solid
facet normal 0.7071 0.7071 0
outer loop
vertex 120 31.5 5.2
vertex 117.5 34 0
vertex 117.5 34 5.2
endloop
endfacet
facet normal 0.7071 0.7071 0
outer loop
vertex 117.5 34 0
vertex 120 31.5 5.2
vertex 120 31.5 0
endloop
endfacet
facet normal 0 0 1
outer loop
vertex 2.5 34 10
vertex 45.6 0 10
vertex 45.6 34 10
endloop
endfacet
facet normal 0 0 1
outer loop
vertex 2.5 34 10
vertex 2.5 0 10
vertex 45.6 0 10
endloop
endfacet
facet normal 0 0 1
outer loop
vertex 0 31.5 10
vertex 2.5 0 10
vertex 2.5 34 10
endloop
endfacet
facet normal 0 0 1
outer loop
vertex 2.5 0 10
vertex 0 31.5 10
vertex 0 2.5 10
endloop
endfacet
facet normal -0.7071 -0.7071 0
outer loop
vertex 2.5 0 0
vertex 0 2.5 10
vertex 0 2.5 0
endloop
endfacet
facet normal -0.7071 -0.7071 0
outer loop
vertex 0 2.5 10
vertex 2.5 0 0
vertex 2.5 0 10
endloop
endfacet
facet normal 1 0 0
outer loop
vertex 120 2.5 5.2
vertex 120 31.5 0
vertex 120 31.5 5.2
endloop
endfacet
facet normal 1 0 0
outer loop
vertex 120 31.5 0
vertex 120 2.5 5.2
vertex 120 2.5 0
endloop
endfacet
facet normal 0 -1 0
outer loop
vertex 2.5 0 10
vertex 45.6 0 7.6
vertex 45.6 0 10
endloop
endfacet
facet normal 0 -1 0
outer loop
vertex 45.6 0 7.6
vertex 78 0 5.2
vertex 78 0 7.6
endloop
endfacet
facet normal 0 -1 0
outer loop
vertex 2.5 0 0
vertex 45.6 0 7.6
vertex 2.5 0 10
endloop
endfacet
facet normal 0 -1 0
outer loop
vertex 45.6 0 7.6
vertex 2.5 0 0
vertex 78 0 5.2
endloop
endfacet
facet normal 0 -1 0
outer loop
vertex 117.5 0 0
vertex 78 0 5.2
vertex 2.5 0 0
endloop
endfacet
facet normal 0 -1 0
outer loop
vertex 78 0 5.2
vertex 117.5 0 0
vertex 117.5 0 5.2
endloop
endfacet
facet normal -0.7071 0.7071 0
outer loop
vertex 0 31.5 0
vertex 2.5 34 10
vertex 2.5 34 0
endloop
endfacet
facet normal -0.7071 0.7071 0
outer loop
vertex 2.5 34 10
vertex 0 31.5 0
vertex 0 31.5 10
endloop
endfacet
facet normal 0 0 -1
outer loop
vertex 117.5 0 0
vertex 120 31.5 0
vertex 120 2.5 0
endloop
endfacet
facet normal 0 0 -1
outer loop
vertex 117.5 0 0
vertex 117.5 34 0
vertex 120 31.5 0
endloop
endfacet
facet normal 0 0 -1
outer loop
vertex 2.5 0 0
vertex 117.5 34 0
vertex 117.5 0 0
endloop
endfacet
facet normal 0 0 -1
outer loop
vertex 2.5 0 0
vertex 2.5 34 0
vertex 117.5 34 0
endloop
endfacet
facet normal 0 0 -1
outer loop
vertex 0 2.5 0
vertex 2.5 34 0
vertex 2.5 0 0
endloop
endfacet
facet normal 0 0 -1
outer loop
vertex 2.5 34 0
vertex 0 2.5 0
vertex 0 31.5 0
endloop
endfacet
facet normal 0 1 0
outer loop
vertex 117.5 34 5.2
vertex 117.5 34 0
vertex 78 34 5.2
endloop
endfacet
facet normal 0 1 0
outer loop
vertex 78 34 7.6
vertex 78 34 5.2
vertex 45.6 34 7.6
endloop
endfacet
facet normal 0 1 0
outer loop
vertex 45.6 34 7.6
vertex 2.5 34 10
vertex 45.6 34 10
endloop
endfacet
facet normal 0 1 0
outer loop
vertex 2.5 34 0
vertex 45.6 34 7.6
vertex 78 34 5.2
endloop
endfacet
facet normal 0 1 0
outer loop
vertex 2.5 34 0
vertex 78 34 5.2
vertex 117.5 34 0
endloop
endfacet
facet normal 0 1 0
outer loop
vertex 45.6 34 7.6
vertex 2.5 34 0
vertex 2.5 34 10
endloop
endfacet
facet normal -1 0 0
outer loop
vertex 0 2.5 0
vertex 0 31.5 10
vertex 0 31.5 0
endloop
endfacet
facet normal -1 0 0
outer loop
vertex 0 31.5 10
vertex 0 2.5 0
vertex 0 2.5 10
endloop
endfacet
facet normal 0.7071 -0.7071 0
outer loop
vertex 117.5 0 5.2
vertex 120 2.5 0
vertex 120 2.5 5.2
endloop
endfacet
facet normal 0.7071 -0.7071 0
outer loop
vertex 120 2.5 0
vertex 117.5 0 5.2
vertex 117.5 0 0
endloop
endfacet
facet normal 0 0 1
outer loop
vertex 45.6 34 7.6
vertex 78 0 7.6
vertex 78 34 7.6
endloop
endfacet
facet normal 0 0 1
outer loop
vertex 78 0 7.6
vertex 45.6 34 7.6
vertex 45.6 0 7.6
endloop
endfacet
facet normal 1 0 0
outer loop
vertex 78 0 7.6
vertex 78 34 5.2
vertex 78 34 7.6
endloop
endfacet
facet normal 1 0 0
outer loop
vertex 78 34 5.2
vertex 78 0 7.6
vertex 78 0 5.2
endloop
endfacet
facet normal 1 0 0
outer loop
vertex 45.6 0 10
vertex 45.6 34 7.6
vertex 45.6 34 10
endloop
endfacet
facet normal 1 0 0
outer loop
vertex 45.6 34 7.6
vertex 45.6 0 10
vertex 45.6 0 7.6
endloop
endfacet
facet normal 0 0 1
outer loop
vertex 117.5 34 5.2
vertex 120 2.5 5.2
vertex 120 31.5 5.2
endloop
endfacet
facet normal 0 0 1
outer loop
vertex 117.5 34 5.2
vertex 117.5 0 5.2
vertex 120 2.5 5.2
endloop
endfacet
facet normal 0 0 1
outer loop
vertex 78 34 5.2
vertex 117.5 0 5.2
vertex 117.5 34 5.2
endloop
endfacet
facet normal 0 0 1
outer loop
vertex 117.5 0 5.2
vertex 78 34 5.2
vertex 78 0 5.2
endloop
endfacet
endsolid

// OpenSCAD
$fn = 32;

// ----------------------------------------------------------------------
// Stepped bar: twostep, 120 x 34 x 10/5.2 mm
// ----------------------------------------------------------------------

// --- parameters (mm) ---
bar_l = 120;              // bar length, X
bar_w = 34;               // bar width, Y
plate_t = 10;             // thickness of the thick zone, Z
thin_t = 5.2;             // thickness of the thin zone
corner_c = 2.5;           // corner chamfer of the bar
step_cut = 4.8;           // material removed from the thin zone
stair1_x = 45.6;          // position of the first stair
stair2_x = 78;            // position of the second stair
mid_t = 7.6;              // thickness of the middle zone
depth_1 = 2.4;            // depth of cut 1 from the top face
depth_2 = 4.8;            // depth of cut 2 from the top face

profile = [[2.5, 0], [117.5, 0], [120, 2.5], [120, 31.5], [117.5, 34], [2.5, 34], [0, 31.5], [0, 2.5]];  // primary outline, 8 points, counter clockwise
void_1 = [[45.6, -1], [78, -1], [78, 35], [45.6, 35]];  // first stair, 4 points
void_2 = [[78, -1], [121, -1], [121, 35], [78, 35]];  // second stair, 4 points

// --- the one profile operation ---
difference() {
  linear_extrude(height = plate_t) polygon(points = profile);
  translate([0, 0, plate_t - depth_1])
    linear_extrude(height = depth_1 + 1) polygon(points = void_1);
  translate([0, 0, plate_t - depth_2])
    linear_extrude(height = depth_2 + 1) polygon(points = void_2);
}
